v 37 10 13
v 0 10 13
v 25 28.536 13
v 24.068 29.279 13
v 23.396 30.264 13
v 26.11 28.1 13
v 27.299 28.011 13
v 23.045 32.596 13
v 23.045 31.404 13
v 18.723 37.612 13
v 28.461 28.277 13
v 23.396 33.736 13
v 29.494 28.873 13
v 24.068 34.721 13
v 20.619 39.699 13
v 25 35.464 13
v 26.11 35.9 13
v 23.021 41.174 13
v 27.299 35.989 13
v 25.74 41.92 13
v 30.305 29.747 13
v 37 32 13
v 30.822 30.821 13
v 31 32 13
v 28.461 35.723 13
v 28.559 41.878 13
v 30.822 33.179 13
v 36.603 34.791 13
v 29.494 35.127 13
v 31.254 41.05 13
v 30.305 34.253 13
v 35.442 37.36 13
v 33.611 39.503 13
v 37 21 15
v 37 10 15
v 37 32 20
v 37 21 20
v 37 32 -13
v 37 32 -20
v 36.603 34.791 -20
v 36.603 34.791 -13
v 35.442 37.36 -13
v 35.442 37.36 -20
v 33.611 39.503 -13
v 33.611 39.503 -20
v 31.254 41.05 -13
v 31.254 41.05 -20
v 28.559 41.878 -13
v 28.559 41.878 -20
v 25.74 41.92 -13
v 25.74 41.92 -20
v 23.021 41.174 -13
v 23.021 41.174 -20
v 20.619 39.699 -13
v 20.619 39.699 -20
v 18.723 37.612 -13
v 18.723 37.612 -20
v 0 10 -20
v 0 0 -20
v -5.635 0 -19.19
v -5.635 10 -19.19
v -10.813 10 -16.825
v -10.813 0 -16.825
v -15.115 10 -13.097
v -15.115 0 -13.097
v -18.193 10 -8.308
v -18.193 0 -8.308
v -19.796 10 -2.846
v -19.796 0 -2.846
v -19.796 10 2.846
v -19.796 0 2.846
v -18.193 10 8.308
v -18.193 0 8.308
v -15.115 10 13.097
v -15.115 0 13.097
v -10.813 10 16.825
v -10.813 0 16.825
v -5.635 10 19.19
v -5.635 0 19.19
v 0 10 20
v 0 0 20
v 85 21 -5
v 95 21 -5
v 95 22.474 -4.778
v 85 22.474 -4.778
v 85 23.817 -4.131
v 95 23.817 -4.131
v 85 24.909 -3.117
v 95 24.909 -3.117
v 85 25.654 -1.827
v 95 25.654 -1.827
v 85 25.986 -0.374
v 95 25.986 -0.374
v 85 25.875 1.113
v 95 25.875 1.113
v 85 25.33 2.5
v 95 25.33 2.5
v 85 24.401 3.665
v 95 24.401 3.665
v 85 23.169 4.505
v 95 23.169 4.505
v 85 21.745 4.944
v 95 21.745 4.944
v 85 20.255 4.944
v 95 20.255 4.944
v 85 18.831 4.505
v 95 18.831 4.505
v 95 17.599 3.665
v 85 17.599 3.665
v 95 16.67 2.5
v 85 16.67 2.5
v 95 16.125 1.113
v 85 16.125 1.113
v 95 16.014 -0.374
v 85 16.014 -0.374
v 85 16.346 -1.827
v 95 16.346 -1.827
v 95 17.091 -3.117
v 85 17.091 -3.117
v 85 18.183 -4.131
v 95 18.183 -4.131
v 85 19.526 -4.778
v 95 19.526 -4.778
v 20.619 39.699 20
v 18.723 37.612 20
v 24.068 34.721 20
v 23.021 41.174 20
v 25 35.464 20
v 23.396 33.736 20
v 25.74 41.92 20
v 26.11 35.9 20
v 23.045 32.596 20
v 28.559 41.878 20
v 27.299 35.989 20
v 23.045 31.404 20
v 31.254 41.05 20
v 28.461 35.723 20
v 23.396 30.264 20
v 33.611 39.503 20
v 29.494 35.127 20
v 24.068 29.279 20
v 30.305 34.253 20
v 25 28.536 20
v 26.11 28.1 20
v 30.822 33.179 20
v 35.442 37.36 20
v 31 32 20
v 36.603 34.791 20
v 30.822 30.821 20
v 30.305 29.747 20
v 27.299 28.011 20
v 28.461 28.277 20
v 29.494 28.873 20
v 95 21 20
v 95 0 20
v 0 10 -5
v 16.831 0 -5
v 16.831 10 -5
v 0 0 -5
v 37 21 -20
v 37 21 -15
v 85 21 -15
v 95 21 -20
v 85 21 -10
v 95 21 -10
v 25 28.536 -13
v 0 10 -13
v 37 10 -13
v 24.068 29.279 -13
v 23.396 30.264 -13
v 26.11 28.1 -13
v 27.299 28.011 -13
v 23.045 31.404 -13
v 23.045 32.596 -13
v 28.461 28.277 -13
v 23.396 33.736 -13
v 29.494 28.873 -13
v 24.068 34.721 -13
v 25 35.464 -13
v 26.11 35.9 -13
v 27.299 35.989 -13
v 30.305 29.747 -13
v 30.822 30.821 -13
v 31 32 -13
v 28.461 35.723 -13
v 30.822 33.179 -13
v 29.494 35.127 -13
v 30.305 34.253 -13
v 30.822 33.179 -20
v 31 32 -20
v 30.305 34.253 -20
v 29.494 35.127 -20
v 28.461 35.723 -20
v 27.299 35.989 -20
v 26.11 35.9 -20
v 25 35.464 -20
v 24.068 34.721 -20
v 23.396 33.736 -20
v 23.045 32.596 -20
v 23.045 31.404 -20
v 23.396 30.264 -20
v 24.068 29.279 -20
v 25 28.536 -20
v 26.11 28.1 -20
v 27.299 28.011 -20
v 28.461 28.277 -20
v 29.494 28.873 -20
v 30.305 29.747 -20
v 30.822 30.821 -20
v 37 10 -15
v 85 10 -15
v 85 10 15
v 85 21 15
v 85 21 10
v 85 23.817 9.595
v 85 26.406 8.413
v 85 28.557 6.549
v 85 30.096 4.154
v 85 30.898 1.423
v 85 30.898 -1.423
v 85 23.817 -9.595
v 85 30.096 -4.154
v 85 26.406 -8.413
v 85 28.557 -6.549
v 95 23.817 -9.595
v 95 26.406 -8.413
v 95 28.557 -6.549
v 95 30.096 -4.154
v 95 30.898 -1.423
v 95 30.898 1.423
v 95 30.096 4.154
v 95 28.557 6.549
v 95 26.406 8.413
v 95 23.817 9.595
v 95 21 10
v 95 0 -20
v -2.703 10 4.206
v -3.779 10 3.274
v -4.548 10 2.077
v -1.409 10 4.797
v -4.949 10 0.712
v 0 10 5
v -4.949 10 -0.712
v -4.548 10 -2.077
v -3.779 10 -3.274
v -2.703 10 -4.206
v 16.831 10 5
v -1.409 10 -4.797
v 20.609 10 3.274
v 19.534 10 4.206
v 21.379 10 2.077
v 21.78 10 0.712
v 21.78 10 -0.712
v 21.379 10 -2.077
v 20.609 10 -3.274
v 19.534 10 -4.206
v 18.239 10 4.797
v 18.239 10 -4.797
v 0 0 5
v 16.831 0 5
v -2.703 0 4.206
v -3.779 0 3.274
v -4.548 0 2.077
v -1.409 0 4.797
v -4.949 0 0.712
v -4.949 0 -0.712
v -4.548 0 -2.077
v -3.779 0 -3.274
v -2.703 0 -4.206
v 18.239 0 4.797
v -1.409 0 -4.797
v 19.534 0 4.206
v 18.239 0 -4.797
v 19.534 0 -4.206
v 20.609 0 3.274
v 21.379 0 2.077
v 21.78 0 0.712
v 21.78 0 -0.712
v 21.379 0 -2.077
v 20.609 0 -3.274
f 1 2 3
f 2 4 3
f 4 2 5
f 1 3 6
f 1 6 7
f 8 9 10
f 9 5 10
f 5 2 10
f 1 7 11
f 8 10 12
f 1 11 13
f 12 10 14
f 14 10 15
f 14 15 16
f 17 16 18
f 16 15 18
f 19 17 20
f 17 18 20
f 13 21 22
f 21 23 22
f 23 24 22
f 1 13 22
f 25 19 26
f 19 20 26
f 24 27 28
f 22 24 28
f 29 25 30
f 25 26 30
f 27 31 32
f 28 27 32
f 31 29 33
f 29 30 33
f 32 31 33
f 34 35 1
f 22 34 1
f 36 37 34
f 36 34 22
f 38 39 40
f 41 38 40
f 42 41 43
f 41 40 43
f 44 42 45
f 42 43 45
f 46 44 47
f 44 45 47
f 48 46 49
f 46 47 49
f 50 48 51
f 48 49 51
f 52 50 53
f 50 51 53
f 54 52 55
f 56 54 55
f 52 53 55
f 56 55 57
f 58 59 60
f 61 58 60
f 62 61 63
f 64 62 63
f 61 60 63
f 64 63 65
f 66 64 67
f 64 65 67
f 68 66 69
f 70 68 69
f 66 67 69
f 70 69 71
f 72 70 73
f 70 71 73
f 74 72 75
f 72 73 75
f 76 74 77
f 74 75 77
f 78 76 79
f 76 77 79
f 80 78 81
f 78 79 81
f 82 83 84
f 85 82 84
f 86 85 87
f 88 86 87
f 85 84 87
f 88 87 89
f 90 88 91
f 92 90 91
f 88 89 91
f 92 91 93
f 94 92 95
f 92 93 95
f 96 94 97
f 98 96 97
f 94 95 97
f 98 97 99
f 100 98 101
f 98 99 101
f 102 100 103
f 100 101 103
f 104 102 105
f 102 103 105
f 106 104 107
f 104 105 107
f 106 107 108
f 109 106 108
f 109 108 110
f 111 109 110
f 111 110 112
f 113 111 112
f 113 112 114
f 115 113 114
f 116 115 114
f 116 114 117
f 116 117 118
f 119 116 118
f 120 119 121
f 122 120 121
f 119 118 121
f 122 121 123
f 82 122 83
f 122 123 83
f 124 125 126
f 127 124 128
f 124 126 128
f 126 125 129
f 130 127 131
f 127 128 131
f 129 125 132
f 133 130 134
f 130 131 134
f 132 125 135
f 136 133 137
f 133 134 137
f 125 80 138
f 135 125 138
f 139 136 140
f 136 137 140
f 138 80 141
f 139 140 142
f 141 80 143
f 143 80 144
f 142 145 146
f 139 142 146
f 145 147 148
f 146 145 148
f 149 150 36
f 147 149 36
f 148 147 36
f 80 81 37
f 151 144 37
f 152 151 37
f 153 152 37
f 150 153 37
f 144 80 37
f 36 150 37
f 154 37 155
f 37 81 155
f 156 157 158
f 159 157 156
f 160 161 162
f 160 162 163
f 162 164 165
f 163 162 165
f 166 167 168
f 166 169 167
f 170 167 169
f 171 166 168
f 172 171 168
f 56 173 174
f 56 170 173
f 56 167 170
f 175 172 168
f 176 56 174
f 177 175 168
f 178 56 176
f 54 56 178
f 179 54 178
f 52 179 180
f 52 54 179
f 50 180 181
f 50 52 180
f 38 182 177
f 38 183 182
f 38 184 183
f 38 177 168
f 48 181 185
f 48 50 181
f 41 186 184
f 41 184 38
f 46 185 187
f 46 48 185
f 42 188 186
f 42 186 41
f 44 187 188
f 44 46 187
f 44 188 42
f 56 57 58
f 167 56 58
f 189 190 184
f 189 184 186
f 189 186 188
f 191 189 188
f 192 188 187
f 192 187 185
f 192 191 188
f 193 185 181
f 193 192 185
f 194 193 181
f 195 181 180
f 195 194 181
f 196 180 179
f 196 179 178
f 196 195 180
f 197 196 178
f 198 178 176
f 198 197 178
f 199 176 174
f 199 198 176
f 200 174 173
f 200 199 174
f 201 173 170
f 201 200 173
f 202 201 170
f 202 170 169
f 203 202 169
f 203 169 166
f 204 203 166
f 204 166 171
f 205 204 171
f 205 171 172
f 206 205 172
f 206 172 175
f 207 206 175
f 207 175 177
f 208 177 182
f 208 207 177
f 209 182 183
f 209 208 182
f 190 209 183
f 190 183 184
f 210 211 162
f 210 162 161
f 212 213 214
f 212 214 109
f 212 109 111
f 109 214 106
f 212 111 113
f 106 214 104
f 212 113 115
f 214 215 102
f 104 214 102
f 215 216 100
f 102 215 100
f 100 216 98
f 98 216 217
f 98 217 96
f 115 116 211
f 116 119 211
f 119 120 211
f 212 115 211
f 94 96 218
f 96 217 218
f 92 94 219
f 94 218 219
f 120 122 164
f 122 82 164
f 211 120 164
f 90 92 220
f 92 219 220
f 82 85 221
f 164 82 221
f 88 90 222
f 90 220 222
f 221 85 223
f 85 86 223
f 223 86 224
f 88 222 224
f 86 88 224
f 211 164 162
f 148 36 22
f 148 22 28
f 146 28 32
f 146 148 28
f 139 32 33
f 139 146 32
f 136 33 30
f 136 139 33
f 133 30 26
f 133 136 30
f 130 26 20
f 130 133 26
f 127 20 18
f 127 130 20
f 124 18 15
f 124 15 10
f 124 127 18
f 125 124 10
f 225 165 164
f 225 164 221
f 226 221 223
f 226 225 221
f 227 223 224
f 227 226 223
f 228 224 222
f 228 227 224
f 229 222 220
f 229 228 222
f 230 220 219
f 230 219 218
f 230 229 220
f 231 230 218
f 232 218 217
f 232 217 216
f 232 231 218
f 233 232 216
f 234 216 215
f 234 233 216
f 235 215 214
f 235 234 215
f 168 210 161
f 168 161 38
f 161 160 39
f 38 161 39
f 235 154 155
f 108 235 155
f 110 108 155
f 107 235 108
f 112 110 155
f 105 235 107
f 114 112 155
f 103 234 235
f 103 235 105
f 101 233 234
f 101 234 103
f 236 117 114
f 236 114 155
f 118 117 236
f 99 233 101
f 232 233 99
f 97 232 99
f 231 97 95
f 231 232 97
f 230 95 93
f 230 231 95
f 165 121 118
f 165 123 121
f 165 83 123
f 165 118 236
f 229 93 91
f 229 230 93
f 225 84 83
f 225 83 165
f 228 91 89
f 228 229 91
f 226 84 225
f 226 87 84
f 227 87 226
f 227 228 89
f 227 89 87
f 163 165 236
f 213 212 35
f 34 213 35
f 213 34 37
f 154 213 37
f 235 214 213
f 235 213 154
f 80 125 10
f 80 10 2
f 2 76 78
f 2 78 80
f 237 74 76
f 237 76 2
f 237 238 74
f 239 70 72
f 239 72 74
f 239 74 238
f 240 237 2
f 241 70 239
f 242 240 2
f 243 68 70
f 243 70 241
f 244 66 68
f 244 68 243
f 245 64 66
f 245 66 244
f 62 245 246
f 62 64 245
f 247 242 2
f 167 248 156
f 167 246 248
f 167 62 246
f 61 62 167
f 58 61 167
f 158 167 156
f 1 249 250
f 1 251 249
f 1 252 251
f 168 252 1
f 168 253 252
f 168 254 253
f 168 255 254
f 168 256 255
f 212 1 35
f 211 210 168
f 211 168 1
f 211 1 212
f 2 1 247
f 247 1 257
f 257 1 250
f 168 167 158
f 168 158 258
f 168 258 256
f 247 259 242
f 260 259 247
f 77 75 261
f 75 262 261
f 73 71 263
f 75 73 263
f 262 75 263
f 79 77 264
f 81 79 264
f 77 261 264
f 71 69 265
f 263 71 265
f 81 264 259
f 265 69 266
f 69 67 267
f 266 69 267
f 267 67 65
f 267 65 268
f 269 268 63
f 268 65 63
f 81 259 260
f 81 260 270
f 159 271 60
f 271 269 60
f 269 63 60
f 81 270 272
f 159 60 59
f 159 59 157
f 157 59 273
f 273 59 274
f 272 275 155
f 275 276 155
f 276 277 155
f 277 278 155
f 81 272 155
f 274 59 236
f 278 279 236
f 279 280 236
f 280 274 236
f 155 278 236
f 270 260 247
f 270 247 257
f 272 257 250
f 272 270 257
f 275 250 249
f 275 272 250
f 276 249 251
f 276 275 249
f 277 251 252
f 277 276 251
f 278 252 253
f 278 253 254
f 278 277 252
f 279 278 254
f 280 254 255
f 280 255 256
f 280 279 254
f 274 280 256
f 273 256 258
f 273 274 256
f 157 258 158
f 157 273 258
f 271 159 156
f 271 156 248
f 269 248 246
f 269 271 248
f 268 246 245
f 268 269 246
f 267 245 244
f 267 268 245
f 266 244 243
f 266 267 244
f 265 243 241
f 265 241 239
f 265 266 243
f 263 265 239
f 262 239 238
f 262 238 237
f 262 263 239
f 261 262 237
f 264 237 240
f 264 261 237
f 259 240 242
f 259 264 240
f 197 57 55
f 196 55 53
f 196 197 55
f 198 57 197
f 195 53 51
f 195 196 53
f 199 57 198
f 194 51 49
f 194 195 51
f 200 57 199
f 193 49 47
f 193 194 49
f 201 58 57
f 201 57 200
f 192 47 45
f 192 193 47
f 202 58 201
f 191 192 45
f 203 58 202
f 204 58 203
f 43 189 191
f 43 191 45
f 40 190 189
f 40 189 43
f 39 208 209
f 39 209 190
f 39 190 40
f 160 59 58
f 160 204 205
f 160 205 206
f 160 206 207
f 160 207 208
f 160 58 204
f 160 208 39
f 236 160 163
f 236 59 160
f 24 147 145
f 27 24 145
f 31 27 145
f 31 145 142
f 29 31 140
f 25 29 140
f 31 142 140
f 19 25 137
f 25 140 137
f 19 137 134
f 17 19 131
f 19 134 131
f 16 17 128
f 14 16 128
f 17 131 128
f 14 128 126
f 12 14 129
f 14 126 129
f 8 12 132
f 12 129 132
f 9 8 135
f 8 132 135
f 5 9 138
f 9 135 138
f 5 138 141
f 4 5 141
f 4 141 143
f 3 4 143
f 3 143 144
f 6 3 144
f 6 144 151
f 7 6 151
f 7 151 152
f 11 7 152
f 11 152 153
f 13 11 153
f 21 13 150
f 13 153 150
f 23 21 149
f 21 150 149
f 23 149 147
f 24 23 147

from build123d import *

# Parameters (mm, degrees)
BOSS_EXTRUDE1_DEPTH = 10
SKETCH2_R           = 4
BOSS_EXTRUDE2_DEPTH = 7
BOSS_EXTRUDE3_DEPTH = 11
SKETCH5_R           = 5
BOSS_EXTRUDE4_DEPTH = 10


with BuildPart() as part:
    # Sketch1 → Boss-Extrude1 (new body)
    with BuildSketch(Plane(origin=(0, 0, 0), x_dir=(1, 0, 0), z_dir=(0, 1, 0))):
        with BuildLine():
            Line((0, -20), (95, -20))
            Line((95, -20), (95, 20))
            Line((95, 20), (0, 20))
            ThreePointArc((0, 20), (-20, 0), (0, -20))
        make_face()
        with BuildLine():
            Line((0, -5), (16.830680512, -5))
            ThreePointArc((16.830680512, -5), (21.830680512, 0), (16.830680512, 5))
            Line((16.830680512, 5), (0, 5))
            ThreePointArc((0, 5), (-5, 0), (0, -5))
        make_face(mode=Mode.SUBTRACT)
    extrude(amount=BOSS_EXTRUDE1_DEPTH)

    # Sketch2 → Boss-Extrude2 (add)
    with BuildSketch(Plane.XY.offset(20)):
        with BuildLine():
            Line((0, 10), (37, 10))
            Line((37, 10), (37, 32))
            ThreePointArc((37, 32), (29.935438849, 41.559455987), (18.723360248, 37.612239696))
            Line((18.723360248, 37.612239696), (0, 10))
        make_face()
        with Locations((27, 32)):
            Circle(SKETCH2_R, mode=Mode.SUBTRACT)
    boss_extrude2 = extrude(amount=-BOSS_EXTRUDE2_DEPTH)

    # Mirror1: Boss-Extrude2 across plane
    add(boss_extrude2.mirror(Plane.XY))

    # Sketch4 → Boss-Extrude3 (add)
    with BuildSketch(Plane(origin=(0, 10, 0), x_dir=(1, 0, 0), z_dir=(0, 1, 0))):
        Polygon((37, -20), (95, -20), (95, -10), (85, -10), (85, -15), (37, -15), align=None)
    boss_extrude3 = extrude(amount=BOSS_EXTRUDE3_DEPTH)

    # Mirror2: Boss-Extrude3 across plane
    add(boss_extrude3.mirror(Plane.XY))

    # Sketch5 → Boss-Extrude4 (add)
    with BuildSketch(Plane(origin=(95, 0, 0), x_dir=(0, 0, -1), z_dir=(1, 0, 0))):
        with BuildLine():
            Line((-10, 10), (10, 10))
            Line((10, 10), (10, 21))
            ThreePointArc((10, 21), (0, 31), (-10, 21))
            Line((-10, 21), (-10, 10))
        make_face()
        with Locations((0, 21)):
            Circle(SKETCH5_R, mode=Mode.SUBTRACT)
    extrude(amount=-BOSS_EXTRUDE4_DEPTH)


solid = part.part
